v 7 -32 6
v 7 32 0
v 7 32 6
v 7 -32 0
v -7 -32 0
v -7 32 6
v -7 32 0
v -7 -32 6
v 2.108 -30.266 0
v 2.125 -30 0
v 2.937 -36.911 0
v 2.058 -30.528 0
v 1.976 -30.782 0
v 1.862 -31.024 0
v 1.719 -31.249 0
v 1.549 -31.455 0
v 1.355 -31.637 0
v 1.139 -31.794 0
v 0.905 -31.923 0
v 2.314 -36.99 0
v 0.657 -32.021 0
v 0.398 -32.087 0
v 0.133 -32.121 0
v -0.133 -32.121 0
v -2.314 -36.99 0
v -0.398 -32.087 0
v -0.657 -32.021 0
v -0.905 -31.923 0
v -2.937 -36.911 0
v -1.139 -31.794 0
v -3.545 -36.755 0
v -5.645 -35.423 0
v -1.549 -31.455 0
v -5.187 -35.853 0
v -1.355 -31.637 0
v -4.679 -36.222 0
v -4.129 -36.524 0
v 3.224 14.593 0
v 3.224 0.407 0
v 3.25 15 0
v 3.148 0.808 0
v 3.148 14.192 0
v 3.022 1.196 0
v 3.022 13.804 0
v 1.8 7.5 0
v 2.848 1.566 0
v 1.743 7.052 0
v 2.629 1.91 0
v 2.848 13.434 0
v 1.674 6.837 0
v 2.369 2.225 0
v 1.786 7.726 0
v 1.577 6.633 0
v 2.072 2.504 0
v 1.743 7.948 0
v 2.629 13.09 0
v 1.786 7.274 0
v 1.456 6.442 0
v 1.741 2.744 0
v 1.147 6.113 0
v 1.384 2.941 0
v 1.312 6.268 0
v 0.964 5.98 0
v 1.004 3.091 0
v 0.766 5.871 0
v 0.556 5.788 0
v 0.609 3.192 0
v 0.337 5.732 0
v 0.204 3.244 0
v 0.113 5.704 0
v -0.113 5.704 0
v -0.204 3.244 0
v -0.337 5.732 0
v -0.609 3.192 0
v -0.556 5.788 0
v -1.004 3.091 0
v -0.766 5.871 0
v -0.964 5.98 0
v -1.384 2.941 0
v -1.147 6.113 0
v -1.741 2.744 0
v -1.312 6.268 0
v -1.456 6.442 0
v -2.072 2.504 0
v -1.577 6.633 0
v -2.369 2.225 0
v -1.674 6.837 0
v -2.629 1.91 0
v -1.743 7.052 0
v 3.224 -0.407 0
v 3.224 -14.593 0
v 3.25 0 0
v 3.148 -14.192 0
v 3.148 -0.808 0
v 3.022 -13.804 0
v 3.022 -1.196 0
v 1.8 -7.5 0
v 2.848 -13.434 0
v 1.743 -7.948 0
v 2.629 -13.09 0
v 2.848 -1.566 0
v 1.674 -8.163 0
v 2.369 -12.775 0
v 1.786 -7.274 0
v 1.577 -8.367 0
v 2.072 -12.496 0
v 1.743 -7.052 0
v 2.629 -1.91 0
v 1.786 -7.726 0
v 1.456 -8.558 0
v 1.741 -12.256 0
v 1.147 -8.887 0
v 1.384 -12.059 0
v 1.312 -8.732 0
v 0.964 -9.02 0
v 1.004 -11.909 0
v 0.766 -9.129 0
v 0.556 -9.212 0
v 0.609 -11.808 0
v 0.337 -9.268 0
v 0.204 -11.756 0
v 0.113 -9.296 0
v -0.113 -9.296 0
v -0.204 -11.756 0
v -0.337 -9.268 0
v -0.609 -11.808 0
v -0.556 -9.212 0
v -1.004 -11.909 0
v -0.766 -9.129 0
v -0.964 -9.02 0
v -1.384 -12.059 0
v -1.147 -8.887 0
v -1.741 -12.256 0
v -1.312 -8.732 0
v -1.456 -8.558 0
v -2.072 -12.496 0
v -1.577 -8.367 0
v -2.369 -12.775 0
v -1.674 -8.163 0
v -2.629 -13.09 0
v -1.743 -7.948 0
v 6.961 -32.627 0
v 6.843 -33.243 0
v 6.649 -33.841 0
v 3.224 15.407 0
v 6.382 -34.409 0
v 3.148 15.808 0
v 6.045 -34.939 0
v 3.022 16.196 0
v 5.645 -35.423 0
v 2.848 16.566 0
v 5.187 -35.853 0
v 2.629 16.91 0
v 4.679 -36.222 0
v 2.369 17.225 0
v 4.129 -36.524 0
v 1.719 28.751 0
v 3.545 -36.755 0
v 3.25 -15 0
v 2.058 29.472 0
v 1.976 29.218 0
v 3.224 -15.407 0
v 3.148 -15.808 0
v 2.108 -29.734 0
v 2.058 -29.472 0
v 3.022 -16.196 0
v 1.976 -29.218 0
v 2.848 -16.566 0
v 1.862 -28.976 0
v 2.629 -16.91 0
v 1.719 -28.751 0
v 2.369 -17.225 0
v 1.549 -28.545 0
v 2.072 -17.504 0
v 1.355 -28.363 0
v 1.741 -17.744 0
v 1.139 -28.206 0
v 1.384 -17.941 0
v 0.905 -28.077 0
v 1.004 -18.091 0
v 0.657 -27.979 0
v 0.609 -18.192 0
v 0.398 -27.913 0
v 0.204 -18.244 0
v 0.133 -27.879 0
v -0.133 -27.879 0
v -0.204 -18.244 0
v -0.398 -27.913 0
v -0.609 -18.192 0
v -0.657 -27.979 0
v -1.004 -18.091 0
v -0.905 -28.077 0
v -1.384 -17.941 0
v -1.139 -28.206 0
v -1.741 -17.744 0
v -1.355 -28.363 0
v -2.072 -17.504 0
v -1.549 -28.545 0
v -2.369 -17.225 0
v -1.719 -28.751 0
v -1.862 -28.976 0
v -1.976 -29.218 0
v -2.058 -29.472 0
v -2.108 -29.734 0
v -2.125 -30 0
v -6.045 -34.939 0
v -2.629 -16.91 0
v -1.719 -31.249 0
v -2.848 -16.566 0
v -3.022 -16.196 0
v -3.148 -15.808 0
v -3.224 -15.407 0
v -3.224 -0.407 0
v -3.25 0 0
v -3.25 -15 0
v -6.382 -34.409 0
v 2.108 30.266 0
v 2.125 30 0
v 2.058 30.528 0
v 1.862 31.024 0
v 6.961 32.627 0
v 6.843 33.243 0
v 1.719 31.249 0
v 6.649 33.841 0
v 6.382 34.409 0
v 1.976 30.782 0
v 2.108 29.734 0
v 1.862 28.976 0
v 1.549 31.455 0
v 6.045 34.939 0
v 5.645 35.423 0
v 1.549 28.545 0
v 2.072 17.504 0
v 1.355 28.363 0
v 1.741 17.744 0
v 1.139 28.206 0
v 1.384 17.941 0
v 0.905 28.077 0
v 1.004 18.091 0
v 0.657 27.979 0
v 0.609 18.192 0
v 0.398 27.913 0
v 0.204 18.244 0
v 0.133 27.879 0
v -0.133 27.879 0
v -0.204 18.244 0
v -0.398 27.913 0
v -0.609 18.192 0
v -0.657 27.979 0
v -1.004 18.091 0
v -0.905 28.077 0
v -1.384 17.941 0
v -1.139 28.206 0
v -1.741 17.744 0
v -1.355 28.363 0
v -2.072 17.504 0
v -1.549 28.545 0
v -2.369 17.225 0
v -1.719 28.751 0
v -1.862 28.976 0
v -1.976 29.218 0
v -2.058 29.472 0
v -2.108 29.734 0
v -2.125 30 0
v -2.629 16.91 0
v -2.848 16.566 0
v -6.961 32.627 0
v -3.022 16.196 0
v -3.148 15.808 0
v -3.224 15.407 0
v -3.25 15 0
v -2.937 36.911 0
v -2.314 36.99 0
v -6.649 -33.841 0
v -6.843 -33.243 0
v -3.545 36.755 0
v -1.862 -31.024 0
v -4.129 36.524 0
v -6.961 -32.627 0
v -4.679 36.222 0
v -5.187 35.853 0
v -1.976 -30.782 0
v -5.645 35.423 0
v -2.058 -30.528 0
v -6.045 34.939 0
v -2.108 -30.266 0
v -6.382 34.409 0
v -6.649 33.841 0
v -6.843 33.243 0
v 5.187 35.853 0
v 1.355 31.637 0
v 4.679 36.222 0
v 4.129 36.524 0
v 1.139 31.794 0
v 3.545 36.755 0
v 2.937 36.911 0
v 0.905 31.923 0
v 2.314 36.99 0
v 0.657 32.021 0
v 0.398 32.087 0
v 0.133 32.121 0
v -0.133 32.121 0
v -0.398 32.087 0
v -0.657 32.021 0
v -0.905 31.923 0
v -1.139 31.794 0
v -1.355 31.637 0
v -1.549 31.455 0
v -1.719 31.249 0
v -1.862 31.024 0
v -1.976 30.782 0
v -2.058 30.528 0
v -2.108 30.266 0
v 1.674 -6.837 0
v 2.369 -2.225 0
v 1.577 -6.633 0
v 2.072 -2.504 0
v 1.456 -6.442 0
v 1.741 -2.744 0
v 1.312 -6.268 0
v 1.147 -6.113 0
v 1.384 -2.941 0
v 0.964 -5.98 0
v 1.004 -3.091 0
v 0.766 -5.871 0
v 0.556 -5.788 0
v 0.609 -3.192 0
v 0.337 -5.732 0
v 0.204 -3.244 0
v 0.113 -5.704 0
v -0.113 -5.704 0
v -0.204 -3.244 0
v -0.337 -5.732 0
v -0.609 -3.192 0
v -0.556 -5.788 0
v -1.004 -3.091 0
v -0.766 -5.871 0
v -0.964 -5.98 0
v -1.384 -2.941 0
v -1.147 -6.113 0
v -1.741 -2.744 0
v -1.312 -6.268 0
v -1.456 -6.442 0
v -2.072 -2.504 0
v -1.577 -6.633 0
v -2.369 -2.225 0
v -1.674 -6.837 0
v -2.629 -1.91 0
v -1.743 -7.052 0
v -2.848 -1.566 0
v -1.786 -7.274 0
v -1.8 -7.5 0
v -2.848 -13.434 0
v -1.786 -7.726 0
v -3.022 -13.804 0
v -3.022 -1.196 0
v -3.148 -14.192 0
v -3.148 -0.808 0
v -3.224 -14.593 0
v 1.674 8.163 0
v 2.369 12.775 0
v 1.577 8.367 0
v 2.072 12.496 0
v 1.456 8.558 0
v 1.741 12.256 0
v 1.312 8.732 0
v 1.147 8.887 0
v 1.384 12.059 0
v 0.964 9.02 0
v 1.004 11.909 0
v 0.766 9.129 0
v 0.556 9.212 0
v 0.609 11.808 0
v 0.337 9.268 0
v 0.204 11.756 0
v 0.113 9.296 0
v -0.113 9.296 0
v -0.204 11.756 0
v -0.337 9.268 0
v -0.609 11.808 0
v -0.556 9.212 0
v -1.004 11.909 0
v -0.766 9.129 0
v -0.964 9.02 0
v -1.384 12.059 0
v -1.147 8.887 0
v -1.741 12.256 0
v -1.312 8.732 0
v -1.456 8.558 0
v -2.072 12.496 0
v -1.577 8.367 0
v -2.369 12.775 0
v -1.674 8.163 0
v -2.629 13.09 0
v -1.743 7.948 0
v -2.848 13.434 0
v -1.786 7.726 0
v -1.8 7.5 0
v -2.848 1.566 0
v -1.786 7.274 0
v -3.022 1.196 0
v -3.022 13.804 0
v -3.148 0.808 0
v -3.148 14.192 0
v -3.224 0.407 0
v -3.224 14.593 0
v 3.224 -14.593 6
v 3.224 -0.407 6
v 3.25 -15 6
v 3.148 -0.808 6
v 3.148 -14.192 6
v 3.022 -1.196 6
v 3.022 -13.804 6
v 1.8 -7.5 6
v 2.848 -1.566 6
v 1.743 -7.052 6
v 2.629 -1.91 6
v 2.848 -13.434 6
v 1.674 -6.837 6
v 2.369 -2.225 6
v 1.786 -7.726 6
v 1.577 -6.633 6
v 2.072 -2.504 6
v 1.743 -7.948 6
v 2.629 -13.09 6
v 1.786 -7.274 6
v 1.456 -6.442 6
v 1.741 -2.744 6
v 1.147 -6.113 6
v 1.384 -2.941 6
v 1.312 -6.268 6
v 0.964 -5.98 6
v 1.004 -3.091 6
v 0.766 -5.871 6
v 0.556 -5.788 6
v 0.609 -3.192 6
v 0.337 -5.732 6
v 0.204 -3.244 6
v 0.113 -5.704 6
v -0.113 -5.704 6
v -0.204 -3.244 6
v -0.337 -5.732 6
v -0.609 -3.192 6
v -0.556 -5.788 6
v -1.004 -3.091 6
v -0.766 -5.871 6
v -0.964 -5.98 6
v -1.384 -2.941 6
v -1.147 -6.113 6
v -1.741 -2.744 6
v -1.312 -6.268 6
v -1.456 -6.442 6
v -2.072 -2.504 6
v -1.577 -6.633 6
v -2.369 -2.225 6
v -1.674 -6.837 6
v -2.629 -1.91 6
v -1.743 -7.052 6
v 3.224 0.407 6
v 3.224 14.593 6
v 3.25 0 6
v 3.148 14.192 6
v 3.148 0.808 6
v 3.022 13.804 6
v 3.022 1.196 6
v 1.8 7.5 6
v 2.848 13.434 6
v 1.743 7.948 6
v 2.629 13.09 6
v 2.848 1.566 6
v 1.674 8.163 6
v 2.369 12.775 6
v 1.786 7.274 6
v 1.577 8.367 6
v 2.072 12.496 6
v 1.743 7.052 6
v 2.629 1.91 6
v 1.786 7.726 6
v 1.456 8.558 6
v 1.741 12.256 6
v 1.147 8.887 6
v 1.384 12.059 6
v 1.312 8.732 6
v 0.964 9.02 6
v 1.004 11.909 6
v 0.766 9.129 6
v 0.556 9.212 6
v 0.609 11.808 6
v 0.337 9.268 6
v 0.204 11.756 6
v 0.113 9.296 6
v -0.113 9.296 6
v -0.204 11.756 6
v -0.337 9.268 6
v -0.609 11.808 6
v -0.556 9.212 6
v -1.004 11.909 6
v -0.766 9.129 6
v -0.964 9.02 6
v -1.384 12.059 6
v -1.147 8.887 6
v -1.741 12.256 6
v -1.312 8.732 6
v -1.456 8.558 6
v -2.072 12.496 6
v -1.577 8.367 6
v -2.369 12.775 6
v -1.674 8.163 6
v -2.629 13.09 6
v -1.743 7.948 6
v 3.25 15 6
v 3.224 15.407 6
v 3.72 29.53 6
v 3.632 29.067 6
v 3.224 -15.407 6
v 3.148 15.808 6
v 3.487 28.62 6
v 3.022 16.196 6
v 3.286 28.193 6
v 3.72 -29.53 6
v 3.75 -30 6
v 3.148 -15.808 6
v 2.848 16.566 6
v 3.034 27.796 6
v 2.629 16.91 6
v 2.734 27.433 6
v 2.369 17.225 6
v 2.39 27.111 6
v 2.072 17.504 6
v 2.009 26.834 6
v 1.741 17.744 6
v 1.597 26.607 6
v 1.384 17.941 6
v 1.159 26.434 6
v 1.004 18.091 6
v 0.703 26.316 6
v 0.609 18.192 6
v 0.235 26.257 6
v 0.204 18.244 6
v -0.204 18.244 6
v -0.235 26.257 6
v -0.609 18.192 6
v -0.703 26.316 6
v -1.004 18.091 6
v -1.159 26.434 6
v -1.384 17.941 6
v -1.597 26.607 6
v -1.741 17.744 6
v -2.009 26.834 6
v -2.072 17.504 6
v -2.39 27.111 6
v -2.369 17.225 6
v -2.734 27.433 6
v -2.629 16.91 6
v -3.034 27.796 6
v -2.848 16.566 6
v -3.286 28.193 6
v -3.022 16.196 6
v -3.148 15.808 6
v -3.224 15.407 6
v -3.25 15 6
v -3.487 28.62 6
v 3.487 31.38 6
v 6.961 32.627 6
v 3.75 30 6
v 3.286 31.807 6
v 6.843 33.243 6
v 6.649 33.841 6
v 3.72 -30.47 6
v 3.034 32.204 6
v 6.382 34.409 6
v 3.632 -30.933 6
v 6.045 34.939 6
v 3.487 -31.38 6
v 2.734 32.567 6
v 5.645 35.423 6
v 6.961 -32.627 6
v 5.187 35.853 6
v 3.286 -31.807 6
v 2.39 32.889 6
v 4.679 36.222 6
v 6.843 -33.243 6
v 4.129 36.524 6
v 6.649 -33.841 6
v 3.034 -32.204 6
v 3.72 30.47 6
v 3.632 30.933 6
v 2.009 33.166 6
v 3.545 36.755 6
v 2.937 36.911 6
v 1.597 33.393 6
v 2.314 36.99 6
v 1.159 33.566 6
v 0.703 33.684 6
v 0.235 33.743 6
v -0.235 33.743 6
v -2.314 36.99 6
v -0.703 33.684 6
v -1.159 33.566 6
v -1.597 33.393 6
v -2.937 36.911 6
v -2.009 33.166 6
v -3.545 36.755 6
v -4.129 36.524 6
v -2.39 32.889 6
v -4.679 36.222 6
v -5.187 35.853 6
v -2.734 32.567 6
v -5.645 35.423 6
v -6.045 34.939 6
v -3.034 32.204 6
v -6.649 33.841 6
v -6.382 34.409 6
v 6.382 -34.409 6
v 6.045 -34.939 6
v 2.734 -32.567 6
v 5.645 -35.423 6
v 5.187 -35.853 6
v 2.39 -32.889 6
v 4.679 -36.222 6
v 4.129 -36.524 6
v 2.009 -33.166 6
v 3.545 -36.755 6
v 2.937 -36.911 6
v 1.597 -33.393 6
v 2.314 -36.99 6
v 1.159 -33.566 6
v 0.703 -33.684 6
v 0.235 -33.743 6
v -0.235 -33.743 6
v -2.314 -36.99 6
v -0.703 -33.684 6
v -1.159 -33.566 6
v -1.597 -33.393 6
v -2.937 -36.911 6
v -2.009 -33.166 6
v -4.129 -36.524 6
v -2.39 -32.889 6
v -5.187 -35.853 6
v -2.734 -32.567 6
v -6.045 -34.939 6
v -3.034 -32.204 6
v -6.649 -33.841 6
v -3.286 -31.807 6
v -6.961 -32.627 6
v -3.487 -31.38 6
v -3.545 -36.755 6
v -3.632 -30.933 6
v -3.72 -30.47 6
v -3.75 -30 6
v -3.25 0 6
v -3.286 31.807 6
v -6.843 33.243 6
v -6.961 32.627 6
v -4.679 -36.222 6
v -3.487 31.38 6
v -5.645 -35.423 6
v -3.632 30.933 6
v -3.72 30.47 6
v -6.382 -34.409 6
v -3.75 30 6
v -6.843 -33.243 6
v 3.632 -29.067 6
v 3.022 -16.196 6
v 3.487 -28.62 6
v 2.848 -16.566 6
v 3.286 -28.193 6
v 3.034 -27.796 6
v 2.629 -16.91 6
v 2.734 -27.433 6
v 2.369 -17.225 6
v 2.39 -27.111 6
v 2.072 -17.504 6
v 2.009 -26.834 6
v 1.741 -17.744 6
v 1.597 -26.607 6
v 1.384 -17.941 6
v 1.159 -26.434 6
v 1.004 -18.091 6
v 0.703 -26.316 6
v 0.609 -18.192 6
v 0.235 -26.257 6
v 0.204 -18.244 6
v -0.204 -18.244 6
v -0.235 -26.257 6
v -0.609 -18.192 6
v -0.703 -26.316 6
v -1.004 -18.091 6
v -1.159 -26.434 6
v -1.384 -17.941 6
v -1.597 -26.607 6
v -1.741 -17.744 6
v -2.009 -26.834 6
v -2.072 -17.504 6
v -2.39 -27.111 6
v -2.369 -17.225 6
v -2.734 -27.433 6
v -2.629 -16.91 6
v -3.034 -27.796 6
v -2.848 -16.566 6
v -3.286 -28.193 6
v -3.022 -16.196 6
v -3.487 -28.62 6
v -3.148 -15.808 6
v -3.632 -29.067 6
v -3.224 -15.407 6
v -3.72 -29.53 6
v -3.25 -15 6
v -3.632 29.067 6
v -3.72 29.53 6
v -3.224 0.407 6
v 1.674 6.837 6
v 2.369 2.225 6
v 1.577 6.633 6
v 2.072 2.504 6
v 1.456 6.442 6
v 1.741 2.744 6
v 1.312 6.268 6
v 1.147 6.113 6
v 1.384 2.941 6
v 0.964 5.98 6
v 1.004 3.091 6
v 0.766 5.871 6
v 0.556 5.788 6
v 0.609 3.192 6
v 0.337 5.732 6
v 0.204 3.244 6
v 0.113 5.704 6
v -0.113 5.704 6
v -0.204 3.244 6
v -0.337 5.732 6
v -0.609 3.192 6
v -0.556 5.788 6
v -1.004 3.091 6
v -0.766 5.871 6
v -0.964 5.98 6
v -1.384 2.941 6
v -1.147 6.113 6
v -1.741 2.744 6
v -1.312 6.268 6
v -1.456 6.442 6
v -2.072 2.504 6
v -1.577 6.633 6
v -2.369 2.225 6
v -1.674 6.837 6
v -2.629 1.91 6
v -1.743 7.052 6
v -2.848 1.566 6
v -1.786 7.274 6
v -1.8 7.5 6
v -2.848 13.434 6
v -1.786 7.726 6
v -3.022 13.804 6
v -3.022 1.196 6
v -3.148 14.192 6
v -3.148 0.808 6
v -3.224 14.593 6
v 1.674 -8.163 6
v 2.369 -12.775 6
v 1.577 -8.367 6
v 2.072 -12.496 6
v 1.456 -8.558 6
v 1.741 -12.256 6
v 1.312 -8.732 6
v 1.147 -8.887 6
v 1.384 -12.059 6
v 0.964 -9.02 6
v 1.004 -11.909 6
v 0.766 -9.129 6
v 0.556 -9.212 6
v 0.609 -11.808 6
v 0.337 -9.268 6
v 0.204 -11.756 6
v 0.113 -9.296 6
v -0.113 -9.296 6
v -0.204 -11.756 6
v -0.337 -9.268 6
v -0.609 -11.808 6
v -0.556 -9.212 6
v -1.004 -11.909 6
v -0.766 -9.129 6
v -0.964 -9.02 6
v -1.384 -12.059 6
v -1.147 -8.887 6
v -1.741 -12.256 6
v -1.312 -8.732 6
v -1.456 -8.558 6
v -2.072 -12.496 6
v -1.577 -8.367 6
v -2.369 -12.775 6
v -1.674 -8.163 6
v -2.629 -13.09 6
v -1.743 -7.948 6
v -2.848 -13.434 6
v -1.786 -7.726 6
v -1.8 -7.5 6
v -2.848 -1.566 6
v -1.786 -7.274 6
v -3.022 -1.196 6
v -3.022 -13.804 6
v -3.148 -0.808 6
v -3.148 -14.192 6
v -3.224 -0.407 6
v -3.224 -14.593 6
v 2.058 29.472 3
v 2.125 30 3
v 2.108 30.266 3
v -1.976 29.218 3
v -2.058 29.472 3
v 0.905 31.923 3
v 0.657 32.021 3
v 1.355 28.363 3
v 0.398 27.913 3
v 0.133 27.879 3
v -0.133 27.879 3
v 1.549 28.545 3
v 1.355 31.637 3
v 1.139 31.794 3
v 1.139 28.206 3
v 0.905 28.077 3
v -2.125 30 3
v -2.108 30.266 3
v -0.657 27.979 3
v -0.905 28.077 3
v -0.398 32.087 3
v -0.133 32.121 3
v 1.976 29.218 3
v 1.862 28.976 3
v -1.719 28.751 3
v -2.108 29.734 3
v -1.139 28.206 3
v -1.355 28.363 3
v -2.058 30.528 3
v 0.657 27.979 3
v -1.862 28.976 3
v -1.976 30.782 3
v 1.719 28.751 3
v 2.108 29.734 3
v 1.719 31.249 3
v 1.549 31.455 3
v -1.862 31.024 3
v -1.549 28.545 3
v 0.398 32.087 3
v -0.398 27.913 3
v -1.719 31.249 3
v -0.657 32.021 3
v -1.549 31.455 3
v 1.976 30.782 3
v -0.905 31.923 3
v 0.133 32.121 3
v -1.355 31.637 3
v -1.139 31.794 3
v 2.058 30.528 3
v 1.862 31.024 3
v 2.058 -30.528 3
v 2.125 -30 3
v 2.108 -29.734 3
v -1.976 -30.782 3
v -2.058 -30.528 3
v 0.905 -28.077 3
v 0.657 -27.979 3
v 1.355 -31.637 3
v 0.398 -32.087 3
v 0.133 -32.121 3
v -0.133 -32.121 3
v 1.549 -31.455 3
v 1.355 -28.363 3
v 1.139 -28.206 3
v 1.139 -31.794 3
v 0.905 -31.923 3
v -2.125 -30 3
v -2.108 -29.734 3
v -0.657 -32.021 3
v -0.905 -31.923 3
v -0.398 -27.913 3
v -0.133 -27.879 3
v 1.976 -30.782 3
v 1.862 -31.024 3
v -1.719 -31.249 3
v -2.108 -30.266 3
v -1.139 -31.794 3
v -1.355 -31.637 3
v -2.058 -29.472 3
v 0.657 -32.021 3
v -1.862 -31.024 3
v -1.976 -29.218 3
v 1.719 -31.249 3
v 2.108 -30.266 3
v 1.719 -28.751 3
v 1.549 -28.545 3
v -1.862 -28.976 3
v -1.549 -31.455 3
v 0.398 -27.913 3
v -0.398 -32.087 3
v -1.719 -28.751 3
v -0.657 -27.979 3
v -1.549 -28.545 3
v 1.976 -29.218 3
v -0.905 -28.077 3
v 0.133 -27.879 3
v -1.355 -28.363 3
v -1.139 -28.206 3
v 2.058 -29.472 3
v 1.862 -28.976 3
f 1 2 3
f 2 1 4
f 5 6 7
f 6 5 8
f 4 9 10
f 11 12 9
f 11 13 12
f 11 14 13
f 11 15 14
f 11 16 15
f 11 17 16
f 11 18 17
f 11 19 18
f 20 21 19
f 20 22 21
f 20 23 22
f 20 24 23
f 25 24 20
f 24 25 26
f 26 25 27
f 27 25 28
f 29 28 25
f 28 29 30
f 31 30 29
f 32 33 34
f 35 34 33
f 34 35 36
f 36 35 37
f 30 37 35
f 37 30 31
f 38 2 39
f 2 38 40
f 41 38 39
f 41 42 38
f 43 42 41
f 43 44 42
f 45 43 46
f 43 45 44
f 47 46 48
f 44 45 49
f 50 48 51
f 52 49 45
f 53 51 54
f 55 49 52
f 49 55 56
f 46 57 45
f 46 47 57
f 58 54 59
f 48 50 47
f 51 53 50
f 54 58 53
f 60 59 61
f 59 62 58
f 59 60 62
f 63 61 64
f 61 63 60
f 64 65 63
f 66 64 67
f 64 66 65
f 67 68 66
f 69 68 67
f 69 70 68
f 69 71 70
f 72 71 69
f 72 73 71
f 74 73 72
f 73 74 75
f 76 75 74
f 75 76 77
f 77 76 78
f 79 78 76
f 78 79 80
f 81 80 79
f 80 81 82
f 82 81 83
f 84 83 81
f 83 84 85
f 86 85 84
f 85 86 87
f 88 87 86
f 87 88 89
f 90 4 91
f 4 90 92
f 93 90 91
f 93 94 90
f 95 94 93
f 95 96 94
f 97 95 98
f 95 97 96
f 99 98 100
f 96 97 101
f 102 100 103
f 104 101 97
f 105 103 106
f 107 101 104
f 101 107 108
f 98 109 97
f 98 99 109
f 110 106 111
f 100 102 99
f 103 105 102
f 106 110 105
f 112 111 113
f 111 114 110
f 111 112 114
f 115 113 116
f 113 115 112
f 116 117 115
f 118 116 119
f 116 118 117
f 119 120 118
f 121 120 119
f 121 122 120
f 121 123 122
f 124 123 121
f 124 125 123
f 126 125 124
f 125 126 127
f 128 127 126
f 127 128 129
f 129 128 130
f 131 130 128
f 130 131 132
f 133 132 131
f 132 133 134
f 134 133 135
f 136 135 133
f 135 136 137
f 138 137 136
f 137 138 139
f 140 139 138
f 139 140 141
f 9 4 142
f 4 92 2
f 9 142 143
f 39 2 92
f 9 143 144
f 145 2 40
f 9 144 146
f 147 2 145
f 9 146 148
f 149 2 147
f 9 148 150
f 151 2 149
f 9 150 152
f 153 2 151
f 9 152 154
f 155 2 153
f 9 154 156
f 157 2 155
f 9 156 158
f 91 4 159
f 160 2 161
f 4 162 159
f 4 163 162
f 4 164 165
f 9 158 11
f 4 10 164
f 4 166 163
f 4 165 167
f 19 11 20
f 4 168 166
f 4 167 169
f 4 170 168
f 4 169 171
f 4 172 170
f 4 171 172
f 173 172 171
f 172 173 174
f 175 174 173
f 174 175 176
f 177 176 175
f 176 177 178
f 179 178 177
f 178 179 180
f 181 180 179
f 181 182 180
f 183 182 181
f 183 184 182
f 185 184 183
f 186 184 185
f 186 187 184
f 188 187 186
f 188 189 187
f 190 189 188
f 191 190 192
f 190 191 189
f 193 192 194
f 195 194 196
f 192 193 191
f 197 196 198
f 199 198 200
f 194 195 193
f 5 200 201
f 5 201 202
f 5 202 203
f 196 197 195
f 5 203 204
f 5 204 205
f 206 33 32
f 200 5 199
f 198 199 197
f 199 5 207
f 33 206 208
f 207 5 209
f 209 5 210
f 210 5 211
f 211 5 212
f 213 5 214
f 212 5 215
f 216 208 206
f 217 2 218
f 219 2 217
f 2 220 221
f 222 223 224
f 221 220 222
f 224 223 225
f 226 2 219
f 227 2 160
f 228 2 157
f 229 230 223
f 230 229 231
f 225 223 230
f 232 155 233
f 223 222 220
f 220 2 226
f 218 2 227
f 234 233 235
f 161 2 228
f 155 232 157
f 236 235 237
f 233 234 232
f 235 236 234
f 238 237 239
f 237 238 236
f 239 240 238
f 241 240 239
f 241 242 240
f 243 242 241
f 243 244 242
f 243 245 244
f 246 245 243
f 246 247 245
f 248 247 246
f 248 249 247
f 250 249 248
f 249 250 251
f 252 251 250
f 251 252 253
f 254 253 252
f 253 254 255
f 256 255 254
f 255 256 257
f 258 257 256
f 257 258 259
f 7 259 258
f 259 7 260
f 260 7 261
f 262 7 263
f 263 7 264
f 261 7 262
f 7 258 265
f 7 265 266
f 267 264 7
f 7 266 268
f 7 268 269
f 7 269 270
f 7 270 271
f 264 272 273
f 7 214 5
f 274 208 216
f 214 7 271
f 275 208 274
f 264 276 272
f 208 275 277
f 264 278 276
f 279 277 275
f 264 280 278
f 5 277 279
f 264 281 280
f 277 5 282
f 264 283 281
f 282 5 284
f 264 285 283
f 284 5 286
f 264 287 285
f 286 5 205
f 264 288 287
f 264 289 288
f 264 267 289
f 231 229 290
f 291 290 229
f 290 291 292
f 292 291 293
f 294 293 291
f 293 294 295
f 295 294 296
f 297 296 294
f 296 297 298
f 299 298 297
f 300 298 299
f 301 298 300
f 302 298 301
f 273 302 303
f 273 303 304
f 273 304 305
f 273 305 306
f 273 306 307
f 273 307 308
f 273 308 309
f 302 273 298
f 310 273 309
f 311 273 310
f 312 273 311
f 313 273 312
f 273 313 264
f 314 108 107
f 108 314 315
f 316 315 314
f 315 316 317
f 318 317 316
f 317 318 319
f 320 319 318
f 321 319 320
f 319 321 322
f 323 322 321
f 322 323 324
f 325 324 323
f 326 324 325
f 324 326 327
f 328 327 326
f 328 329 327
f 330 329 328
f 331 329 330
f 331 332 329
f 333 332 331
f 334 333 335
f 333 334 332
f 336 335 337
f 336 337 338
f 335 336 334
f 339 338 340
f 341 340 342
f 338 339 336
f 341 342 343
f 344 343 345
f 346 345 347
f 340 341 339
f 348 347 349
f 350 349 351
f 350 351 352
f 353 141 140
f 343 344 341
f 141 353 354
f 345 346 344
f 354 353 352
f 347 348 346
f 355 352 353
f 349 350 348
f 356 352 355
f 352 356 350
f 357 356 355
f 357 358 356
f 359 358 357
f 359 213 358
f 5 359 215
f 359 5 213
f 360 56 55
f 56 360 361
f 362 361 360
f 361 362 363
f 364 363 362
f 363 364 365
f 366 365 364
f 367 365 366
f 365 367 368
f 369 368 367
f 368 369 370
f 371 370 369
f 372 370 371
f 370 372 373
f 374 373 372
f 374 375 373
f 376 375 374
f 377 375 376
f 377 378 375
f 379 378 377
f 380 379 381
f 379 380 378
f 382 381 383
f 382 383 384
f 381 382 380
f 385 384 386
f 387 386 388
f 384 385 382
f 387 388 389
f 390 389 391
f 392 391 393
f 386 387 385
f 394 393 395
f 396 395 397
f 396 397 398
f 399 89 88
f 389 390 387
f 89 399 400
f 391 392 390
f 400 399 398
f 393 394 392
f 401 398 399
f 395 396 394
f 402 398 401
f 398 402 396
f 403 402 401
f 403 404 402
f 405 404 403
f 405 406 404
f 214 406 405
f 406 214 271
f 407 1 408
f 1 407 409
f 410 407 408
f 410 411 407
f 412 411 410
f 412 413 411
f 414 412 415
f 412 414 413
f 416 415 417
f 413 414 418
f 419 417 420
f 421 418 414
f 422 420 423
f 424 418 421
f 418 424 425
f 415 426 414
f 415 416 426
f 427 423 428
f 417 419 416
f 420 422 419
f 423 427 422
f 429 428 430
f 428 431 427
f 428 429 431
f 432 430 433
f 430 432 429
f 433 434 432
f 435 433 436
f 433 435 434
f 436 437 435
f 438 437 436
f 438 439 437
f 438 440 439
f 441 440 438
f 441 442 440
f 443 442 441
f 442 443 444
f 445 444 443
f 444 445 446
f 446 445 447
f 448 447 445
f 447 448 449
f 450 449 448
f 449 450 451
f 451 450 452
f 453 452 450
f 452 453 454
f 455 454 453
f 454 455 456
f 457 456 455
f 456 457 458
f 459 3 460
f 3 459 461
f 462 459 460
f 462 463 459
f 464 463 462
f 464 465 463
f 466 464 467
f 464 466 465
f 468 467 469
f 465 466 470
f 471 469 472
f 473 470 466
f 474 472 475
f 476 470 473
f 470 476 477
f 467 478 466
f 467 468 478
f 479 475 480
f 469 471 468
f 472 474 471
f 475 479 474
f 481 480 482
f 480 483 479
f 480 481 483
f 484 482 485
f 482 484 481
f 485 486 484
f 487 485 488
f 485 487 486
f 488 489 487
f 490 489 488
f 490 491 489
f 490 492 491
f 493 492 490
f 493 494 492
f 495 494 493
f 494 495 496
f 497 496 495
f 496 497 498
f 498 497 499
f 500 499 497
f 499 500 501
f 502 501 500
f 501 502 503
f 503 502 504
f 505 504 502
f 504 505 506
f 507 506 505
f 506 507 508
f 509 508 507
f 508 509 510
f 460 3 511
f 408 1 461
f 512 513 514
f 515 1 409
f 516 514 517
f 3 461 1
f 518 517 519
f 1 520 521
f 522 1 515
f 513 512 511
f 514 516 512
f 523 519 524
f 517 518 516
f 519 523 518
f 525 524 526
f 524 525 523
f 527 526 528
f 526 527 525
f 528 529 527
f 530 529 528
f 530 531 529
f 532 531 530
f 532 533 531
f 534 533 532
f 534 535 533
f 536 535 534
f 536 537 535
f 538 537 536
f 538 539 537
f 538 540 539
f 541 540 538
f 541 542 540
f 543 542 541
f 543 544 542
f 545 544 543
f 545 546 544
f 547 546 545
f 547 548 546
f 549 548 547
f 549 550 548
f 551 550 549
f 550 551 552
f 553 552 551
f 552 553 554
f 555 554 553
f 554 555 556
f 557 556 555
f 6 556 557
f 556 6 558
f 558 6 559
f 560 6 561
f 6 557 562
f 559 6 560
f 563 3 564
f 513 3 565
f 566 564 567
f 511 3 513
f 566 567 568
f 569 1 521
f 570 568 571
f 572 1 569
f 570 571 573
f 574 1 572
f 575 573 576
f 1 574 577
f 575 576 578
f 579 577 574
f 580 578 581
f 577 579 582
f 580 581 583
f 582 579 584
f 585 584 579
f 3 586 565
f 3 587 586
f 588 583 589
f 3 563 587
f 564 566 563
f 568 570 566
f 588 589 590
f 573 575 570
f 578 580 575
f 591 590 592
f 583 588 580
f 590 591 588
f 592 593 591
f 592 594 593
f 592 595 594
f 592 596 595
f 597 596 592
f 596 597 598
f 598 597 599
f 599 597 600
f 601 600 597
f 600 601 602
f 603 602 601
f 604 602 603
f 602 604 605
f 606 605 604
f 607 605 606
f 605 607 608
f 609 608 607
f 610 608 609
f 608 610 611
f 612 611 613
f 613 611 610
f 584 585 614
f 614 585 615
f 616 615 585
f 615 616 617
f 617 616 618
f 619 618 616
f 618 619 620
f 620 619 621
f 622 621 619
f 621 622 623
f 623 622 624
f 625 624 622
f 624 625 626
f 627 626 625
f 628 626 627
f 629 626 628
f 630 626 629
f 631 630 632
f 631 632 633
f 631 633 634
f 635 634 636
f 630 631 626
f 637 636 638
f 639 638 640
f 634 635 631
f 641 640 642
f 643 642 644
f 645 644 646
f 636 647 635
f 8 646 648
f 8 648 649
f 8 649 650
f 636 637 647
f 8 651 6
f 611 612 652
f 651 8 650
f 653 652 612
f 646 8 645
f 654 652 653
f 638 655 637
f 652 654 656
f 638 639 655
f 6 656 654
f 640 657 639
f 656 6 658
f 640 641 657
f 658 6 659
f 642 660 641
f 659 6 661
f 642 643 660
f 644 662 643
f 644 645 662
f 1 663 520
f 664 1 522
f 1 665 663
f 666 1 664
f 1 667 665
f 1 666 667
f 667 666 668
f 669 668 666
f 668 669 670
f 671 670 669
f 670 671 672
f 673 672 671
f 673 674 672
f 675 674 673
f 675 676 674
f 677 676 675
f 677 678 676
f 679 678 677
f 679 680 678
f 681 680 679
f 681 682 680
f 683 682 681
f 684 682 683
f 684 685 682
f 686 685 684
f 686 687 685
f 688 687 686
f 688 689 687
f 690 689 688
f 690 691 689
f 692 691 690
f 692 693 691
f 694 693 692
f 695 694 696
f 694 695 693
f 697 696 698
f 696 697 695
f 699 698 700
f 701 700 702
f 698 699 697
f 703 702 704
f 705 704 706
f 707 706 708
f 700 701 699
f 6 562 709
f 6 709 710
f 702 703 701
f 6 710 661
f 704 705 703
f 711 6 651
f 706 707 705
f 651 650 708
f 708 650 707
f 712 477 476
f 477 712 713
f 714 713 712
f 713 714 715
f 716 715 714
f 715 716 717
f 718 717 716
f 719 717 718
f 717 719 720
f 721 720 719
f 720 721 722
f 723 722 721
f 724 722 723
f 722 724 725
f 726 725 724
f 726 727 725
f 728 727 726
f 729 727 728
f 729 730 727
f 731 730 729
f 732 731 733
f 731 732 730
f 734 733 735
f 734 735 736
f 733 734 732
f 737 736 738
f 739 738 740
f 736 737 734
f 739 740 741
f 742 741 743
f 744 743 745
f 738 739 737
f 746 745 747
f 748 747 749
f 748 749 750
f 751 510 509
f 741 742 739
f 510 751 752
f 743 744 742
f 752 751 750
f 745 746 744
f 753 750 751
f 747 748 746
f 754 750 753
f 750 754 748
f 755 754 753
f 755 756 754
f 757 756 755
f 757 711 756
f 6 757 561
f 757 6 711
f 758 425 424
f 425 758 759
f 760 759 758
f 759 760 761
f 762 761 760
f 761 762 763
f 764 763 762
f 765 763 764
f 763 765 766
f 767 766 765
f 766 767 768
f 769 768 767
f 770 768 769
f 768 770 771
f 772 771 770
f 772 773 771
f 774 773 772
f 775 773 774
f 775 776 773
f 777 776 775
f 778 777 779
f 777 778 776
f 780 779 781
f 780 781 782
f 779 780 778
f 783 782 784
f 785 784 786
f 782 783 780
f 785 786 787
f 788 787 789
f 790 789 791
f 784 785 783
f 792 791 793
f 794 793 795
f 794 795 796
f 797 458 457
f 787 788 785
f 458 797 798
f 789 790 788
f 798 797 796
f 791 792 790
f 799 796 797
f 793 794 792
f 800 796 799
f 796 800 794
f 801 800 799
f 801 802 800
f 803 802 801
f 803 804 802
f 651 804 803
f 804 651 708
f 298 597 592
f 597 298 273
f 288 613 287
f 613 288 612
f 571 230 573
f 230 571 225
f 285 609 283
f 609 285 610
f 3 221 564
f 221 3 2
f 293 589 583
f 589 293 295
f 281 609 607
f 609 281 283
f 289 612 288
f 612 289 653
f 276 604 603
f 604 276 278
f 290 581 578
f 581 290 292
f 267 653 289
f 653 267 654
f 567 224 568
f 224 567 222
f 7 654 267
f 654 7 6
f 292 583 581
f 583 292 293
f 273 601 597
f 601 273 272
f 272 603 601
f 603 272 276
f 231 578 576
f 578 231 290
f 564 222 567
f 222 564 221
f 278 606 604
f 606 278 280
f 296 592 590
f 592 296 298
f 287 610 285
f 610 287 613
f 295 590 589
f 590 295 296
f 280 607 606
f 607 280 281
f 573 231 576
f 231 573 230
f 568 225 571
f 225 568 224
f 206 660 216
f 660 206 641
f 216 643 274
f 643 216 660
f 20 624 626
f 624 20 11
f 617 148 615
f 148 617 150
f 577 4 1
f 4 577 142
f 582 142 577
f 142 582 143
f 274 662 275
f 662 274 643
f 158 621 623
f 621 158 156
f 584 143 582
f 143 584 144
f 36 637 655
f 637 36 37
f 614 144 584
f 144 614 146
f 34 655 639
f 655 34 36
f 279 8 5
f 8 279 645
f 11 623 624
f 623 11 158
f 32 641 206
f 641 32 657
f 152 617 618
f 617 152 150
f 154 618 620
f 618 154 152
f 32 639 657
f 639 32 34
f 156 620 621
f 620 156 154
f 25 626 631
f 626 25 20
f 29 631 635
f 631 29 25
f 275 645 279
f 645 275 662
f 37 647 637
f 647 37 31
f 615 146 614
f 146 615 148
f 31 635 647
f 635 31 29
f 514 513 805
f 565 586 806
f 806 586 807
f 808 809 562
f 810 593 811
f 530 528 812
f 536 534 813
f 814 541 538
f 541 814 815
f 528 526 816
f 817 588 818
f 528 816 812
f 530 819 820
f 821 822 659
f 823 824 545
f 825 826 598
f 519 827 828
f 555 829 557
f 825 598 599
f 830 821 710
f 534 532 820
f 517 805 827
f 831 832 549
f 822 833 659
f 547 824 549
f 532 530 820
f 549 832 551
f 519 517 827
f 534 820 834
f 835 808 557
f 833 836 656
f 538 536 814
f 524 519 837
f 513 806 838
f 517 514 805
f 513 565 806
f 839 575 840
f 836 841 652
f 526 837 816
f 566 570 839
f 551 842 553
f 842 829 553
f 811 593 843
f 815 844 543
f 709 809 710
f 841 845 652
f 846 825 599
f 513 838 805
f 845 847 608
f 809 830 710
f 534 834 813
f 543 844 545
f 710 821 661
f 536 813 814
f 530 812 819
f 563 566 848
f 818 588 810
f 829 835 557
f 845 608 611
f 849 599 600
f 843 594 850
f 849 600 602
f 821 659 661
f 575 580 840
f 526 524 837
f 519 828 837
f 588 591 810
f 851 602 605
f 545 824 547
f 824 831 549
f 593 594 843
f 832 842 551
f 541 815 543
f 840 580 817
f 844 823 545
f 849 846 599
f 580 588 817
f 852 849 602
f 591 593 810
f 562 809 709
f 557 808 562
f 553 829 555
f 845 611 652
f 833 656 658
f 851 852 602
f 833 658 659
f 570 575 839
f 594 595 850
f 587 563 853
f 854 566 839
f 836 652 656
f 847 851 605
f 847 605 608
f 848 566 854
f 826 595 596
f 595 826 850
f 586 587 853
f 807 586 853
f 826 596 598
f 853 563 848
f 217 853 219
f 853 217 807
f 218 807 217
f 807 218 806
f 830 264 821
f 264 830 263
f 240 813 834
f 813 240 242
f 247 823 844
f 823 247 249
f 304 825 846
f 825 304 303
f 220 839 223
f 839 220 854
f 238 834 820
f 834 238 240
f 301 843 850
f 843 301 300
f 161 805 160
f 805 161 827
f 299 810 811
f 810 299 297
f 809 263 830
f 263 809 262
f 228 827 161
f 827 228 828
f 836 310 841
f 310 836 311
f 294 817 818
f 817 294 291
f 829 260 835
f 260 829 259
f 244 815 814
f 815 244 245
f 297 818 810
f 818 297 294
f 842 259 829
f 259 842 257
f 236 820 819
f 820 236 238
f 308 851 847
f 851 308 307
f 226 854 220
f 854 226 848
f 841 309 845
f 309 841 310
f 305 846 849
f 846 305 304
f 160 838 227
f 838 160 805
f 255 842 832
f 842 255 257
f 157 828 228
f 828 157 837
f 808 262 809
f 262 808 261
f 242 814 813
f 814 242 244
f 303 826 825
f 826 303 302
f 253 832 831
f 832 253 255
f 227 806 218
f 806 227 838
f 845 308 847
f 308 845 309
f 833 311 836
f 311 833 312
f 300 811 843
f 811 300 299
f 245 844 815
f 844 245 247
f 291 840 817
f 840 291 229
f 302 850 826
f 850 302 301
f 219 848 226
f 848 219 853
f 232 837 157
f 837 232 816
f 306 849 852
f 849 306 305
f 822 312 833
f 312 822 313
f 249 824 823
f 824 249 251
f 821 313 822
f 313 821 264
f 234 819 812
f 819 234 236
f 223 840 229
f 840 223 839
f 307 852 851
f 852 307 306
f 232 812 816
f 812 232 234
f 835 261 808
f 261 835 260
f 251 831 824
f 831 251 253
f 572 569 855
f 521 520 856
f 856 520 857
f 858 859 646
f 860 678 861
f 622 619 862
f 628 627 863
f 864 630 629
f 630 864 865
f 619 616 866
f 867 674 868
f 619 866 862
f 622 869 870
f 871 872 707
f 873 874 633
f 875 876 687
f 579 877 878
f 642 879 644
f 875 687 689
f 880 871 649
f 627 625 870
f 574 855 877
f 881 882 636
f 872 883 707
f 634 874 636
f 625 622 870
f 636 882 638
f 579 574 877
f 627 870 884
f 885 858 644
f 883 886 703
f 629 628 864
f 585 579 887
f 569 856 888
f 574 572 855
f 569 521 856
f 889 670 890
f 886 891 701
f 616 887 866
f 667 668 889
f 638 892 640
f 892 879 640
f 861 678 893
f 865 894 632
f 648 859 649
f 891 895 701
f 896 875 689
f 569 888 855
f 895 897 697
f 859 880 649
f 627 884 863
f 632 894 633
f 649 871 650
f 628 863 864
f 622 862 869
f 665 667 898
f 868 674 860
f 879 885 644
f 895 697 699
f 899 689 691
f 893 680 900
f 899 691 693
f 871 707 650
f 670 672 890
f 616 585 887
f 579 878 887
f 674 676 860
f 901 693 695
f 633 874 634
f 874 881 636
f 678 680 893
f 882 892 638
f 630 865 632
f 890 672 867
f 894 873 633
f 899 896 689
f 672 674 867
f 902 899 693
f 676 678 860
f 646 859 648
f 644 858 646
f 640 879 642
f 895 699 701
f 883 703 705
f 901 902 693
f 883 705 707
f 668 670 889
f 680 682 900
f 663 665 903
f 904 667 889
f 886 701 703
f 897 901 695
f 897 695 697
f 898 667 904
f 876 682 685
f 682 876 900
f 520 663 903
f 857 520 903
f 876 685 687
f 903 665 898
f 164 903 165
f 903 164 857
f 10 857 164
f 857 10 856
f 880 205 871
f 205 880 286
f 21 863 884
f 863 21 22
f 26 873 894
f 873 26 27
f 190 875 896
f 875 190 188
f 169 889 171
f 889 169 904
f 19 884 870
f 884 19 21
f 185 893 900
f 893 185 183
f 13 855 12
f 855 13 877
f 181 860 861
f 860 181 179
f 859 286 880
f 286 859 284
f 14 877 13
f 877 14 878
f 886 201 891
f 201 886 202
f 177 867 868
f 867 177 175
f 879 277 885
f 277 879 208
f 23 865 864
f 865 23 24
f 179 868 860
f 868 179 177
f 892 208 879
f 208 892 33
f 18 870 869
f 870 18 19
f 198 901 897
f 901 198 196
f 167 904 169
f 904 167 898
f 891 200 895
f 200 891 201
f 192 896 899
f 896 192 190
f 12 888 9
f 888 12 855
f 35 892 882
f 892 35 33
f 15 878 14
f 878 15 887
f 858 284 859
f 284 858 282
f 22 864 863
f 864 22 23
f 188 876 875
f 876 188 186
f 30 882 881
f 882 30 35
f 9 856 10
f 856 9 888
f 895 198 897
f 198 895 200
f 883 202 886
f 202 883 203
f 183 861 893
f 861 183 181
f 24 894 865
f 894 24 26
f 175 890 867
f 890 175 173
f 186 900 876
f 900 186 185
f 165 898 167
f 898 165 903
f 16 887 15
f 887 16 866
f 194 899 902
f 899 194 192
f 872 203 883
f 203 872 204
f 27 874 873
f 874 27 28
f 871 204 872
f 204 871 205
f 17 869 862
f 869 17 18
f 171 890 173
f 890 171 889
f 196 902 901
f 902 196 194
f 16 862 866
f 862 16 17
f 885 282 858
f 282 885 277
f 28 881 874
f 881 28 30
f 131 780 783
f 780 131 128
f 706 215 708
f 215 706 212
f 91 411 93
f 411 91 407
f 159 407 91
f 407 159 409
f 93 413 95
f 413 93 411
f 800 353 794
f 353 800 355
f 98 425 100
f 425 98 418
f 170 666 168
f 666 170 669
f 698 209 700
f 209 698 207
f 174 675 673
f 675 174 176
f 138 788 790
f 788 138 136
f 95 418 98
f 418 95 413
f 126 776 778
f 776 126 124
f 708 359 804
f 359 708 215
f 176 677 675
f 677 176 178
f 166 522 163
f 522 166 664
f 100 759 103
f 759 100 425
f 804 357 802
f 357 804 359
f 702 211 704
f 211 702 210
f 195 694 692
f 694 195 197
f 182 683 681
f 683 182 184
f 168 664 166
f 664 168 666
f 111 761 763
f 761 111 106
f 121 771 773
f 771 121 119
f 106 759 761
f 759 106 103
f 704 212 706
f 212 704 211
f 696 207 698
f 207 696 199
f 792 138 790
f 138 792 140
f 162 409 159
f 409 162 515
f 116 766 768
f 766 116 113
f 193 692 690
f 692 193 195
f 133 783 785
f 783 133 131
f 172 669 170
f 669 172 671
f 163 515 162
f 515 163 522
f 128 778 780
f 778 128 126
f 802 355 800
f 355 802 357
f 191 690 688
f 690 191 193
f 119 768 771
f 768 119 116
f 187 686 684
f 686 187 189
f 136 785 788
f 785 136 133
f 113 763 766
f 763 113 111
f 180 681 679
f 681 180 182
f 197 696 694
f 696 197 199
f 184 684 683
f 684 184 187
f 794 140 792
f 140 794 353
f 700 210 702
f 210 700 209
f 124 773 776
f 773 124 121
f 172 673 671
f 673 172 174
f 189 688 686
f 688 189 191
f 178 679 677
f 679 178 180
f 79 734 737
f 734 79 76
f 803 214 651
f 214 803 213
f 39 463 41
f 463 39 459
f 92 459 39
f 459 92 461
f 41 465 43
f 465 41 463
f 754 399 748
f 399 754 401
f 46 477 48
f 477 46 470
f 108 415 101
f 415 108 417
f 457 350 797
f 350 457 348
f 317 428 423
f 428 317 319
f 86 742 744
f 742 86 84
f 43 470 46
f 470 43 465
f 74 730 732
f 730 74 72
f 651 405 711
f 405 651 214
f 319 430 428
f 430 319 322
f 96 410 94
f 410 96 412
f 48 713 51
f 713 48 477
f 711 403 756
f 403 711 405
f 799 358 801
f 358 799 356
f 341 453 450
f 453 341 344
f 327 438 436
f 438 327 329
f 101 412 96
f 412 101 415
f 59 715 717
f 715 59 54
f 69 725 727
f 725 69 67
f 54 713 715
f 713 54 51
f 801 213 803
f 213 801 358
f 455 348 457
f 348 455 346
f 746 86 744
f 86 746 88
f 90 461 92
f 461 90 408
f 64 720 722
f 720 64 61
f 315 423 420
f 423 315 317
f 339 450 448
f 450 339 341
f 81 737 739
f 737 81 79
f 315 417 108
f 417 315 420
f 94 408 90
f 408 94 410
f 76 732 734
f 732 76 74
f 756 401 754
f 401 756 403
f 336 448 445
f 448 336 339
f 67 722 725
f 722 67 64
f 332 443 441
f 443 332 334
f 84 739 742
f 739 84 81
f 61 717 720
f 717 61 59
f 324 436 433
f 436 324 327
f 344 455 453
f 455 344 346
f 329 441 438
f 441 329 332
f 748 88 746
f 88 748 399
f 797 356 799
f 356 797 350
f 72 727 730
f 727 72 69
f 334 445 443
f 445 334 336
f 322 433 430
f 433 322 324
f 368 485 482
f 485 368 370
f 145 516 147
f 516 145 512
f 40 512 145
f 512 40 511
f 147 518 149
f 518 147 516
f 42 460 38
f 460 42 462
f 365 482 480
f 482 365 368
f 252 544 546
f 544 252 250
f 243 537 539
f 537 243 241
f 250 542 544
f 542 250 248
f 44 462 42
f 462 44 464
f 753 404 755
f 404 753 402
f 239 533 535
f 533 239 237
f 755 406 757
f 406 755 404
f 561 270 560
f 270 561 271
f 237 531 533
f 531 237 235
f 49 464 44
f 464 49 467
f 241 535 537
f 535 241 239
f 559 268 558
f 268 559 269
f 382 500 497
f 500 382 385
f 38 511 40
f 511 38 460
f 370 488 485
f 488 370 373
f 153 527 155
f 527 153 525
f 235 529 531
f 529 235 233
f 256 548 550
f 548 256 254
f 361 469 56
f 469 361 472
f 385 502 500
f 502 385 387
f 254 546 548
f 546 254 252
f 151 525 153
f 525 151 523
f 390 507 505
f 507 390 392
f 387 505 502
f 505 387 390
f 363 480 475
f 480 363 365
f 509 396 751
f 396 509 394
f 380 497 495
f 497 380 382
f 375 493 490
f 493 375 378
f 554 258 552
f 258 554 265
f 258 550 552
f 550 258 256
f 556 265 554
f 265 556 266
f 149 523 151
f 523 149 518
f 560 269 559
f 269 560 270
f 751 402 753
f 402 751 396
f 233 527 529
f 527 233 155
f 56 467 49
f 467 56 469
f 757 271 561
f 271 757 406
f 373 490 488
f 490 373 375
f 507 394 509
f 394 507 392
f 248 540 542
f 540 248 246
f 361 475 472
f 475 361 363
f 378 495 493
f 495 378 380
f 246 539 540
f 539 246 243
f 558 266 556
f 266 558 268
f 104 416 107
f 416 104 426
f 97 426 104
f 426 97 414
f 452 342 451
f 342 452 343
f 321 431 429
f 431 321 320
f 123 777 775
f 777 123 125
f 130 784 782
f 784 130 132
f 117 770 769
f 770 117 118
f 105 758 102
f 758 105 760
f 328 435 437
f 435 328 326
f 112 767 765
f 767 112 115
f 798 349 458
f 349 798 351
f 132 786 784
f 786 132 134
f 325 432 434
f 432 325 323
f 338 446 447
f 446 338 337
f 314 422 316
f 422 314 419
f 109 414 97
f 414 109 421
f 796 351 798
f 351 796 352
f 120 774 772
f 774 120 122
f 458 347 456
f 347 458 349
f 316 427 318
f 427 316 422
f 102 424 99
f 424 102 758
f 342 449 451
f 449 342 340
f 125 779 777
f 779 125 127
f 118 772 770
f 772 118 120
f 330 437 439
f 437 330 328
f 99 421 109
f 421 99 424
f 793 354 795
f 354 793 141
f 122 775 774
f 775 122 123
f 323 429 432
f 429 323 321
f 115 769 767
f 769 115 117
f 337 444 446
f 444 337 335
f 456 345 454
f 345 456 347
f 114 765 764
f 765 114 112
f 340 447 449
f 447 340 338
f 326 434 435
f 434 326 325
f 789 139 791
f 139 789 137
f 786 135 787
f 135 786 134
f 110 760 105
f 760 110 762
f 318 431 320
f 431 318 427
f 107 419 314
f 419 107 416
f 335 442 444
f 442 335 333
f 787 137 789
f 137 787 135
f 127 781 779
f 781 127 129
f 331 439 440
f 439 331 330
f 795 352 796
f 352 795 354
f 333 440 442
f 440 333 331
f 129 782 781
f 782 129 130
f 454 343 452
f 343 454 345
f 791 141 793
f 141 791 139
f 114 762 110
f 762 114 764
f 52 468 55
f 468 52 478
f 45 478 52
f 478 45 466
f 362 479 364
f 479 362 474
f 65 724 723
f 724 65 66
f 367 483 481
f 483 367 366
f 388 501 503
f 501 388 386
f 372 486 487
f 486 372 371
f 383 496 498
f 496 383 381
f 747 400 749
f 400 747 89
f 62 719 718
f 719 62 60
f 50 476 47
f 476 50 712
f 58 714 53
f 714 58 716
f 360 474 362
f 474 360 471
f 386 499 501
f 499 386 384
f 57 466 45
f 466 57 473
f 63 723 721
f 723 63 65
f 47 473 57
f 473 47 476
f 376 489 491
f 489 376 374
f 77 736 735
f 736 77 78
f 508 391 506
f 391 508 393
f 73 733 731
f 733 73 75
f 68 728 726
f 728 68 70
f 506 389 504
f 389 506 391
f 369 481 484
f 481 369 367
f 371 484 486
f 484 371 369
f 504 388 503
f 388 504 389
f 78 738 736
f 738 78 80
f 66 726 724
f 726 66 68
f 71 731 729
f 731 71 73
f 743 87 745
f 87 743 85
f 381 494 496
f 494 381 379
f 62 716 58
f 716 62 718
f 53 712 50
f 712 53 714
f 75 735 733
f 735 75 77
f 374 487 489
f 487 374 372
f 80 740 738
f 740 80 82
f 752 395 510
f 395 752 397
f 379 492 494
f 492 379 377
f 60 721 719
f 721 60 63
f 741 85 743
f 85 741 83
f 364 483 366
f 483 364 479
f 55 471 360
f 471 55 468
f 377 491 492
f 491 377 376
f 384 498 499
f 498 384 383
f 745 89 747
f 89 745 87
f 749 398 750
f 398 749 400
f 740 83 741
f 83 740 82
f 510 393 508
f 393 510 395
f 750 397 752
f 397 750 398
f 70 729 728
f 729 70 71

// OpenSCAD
$fn = 50;


difference() {
	union() {
		hull() {
			translate(v = [-2.0000000000, 17.0000000000, 0]) {
				cylinder(h = 6, r = 5);
			}
			translate(v = [2.0000000000, 17.0000000000, 0]) {
				cylinder(h = 6, r = 5);
			}
			translate(v = [-2.0000000000, -17.0000000000, 0]) {
				cylinder(h = 6, r = 5);
			}
			translate(v = [2.0000000000, -17.0000000000, 0]) {
				cylinder(h = 6, r = 5);
			}
		}
		translate(v = [0.0000000000, 22.5000000000, 0]) {
			hull() {
				translate(v = [-2.0000000000, 9.5000000000, 0]) {
					cylinder(h = 6, r = 5);
				}
				translate(v = [2.0000000000, 9.5000000000, 0]) {
					cylinder(h = 6, r = 5);
				}
				translate(v = [-2.0000000000, -9.5000000000, 0]) {
					cylinder(h = 6, r = 5);
				}
				translate(v = [2.0000000000, -9.5000000000, 0]) {
					cylinder(h = 6, r = 5);
				}
			}
		}
		translate(v = [0.0000000000, 22.5000000000, 0]) {
			hull() {
				translate(v = [-2.0000000000, 9.5000000000, 0]) {
					cylinder(h = 6, r = 5);
				}
				translate(v = [2.0000000000, 9.5000000000, 0]) {
					cylinder(h = 6, r = 5);
				}
				translate(v = [-2.0000000000, -9.5000000000, 0]) {
					cylinder(h = 6, r = 5);
				}
				translate(v = [2.0000000000, -9.5000000000, 0]) {
					cylinder(h = 6, r = 5);
				}
			}
		}
		translate(v = [0.0000000000, -22.5000000000, 0]) {
			hull() {
				translate(v = [-2.0000000000, 9.5000000000, 0]) {
					cylinder(h = 6, r = 5);
				}
				translate(v = [2.0000000000, 9.5000000000, 0]) {
					cylinder(h = 6, r = 5);
				}
				translate(v = [-2.0000000000, -9.5000000000, 0]) {
					cylinder(h = 6, r = 5);
				}
				translate(v = [2.0000000000, -9.5000000000, 0]) {
					cylinder(h = 6, r = 5);
				}
			}
		}
		translate(v = [0.0000000000, -22.5000000000, 0]) {
			hull() {
				translate(v = [-2.0000000000, 9.5000000000, 0]) {
					cylinder(h = 6, r = 5);
				}
				translate(v = [2.0000000000, 9.5000000000, 0]) {
					cylinder(h = 6, r = 5);
				}
				translate(v = [-2.0000000000, -9.5000000000, 0]) {
					cylinder(h = 6, r = 5);
				}
				translate(v = [2.0000000000, -9.5000000000, 0]) {
					cylinder(h = 6, r = 5);
				}
			}
		}
	}
	union() {
		translate(v = [0.0000000000, 30.0000000000, 6]) {
			rotate(a = [0, 0, 0]) {
				difference() {
					union() {
						#translate(v = [0, 0, -6.0000000000]) {
							cylinder(h = 6, r = 2.0000000000);
						}
						#translate(v = [0, 0, -3]) {
							cylinder(h = 3, r1 = 2.1250000000, r2 = 3.7500000000);
						}
						#translate(v = [0, 0, -6.0000000000]) {
							cylinder(h = 6, r = 2.1250000000);
						}
						#translate(v = [0, 0, -6.0000000000]) {
							cylinder(h = 6, r = 2.0000000000);
						}
					}
					union();
				}
			}
		}
		translate(v = [0.0000000000, 30.0000000000, 6]) {
			rotate(a = [0, 0, 0]) {
				difference() {
					union() {
						#translate(v = [0, 0, -6.0000000000]) {
							cylinder(h = 6, r = 2.0000000000);
						}
						#translate(v = [0, 0, -3]) {
							cylinder(h = 3, r1 = 2.1250000000, r2 = 3.7500000000);
						}
						#translate(v = [0, 0, -6.0000000000]) {
							cylinder(h = 6, r = 2.1250000000);
						}
						#translate(v = [0, 0, -6.0000000000]) {
							cylinder(h = 6, r = 2.0000000000);
						}
					}
					union();
				}
			}
		}
		translate(v = [0.0000000000, -30.0000000000, 6]) {
			rotate(a = [0, 0, 0]) {
				difference() {
					union() {
						#translate(v = [0, 0, -6.0000000000]) {
							cylinder(h = 6, r = 2.0000000000);
						}
						#translate(v = [0, 0, -3]) {
							cylinder(h = 3, r1 = 2.1250000000, r2 = 3.7500000000);
						}
						#translate(v = [0, 0, -6.0000000000]) {
							cylinder(h = 6, r = 2.1250000000);
						}
						#translate(v = [0, 0, -6.0000000000]) {
							cylinder(h = 6, r = 2.0000000000);
						}
					}
					union();
				}
			}
		}
		translate(v = [0.0000000000, -30.0000000000, 6]) {
			rotate(a = [0, 0, 0]) {
				difference() {
					union() {
						#translate(v = [0, 0, -6.0000000000]) {
							cylinder(h = 6, r = 2.0000000000);
						}
						#translate(v = [0, 0, -3]) {
							cylinder(h = 3, r1 = 2.1250000000, r2 = 3.7500000000);
						}
						#translate(v = [0, 0, -6.0000000000]) {
							cylinder(h = 6, r = 2.1250000000);
						}
						#translate(v = [0, 0, -6.0000000000]) {
							cylinder(h = 6, r = 2.0000000000);
						}
					}
					union();
				}
			}
		}
		translate(v = [0.0000000000, -15.0000000000, 0]) {
			translate(v = [0, 0, -100]) {
				cylinder(h = 200, r = 3.2500000000);
			}
		}
		translate(v = [0, 0, -100]) {
			cylinder(h = 200, r = 3.2500000000);
		}
		translate(v = [0.0000000000, 15.0000000000, 0]) {
			translate(v = [0, 0, -100]) {
				cylinder(h = 200, r = 3.2500000000);
			}
		}
		translate(v = [0.0000000000, -15.0000000000, 0]) {
			translate(v = [0, 0, -100]) {
				cylinder(h = 200, r = 1.8000000000);
			}
		}
		translate(v = [0.0000000000, -7.5000000000, 0]) {
			translate(v = [0, 0, -100]) {
				cylinder(h = 200, r = 1.8000000000);
			}
		}
		translate(v = [0, 0, -100]) {
			cylinder(h = 200, r = 1.8000000000);
		}
		translate(v = [0.0000000000, 7.5000000000, 0]) {
			translate(v = [0, 0, -100]) {
				cylinder(h = 200, r = 1.8000000000);
			}
		}
		translate(v = [0.0000000000, 15.0000000000, 0]) {
			translate(v = [0, 0, -100]) {
				cylinder(h = 200, r = 1.8000000000);
			}
		}
	}
}
